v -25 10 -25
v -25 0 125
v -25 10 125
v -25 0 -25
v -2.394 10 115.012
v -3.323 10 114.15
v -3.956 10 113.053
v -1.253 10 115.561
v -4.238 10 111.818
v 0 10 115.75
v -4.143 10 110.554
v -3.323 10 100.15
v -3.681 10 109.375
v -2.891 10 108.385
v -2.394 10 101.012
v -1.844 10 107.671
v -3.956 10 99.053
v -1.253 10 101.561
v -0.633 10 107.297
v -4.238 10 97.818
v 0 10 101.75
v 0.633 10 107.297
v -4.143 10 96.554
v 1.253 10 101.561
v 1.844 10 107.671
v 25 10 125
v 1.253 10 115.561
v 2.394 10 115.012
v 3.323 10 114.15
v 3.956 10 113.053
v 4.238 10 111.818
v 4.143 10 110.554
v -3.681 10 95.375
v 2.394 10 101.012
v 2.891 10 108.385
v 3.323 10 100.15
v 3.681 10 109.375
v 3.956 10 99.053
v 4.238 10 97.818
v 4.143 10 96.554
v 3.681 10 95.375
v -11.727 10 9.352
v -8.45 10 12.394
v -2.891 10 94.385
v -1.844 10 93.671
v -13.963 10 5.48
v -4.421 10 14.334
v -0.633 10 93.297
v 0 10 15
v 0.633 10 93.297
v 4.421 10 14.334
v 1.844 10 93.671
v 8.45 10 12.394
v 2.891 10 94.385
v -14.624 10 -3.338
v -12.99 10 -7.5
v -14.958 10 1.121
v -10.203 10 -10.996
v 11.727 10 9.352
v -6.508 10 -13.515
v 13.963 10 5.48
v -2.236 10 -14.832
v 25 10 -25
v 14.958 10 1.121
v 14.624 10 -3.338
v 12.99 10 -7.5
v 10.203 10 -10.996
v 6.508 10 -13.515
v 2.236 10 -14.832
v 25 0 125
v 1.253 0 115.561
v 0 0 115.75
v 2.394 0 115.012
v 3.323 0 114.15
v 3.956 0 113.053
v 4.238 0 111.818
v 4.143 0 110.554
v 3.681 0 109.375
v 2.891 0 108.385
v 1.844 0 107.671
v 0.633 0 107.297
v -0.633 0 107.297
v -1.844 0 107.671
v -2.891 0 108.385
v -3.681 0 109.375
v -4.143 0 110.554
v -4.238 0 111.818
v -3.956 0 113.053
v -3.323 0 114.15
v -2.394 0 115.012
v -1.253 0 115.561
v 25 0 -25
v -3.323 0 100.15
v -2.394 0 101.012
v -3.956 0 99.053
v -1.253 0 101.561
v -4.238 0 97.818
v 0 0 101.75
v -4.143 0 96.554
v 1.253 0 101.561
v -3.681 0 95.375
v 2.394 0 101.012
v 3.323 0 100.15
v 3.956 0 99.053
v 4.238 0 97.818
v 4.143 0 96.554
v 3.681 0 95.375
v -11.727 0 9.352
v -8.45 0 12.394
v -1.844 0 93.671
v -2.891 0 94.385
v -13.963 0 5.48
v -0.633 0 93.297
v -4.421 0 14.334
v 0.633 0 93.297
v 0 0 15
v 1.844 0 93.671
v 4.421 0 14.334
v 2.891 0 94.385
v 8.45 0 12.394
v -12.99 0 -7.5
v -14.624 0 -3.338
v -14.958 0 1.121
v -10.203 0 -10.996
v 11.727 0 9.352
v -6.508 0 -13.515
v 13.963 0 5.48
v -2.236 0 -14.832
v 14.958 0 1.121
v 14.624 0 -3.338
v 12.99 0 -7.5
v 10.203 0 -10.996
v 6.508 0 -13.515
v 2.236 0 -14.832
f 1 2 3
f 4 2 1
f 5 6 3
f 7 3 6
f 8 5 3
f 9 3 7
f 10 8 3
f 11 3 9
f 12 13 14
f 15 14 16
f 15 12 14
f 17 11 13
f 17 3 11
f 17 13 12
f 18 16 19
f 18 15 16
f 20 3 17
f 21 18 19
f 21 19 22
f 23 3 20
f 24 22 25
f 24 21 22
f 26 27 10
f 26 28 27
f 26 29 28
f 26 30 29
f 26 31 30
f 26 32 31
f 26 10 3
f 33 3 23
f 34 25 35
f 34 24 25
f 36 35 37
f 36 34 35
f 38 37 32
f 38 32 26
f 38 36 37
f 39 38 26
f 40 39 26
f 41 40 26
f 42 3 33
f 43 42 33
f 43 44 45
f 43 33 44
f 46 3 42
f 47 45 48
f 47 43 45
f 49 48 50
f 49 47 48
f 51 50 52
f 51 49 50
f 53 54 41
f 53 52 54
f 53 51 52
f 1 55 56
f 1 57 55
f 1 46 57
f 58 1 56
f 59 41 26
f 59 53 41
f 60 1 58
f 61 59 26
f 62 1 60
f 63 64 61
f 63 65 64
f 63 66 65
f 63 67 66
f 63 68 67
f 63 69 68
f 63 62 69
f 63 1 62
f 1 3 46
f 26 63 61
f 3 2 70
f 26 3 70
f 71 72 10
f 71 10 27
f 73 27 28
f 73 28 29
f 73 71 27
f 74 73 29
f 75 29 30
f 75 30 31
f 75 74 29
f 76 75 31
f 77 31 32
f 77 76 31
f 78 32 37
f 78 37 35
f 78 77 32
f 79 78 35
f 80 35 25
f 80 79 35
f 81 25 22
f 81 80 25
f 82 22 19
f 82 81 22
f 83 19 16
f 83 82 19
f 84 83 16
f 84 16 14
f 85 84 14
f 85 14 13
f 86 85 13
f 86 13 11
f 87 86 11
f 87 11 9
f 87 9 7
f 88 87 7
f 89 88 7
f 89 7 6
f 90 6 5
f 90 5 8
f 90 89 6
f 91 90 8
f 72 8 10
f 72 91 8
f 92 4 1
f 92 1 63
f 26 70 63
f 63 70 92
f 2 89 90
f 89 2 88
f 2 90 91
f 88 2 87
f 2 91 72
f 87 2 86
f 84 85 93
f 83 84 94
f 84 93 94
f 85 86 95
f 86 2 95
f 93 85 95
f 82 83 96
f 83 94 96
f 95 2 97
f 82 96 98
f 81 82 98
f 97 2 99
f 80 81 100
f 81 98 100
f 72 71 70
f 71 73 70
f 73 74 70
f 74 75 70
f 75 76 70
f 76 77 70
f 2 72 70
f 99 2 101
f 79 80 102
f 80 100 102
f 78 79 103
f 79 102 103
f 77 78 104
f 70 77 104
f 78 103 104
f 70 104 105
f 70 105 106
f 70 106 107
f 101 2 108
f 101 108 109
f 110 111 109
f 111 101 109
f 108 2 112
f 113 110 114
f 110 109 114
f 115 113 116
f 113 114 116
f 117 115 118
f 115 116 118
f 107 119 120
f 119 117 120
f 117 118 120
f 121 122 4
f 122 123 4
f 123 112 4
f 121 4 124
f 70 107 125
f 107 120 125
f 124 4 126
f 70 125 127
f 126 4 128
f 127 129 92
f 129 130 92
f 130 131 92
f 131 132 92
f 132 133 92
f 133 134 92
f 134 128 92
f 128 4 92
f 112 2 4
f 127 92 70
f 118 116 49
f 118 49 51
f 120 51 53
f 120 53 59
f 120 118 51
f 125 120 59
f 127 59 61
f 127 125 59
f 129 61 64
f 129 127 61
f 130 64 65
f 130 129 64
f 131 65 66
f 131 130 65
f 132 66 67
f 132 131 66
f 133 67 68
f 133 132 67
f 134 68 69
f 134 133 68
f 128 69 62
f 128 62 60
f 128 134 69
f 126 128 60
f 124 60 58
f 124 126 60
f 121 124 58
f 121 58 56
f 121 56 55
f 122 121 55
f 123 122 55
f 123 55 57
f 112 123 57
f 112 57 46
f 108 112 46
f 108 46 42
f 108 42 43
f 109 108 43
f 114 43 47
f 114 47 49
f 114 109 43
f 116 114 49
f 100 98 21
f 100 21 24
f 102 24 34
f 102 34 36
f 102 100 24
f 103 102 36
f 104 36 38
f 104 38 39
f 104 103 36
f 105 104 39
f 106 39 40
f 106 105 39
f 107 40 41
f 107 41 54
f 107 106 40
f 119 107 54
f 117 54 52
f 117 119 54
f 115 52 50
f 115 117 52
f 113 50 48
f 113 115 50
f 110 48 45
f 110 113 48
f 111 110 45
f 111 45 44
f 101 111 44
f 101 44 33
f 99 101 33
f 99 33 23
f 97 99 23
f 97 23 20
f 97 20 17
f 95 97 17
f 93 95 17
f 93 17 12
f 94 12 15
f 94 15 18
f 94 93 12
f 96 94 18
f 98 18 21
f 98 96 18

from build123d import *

# Parameters (mm, degrees)
SKETCH1_W           = 50
SKETCH1_H           = 150
SKETCH1_R           = 15
BOSS_EXTRUDE1_DEPTH = 10
SKETCH2_R           = 4.25
CUT_EXTRUDE1_DEPTH  = 10


with BuildPart() as part:
    # Sketch1 → Boss-Extrude1 (new body)
    with BuildSketch(Plane(origin=(0, 0, 0), x_dir=(1, 0, 0), z_dir=(0, 1, 0))):
        with Locations((0, -50)):
            Rectangle(SKETCH1_W, SKETCH1_H)
        with Locations(Location((0, 0, 0), (0, 0, 270))):
            Circle(SKETCH1_R, mode=Mode.SUBTRACT)
    extrude(amount=BOSS_EXTRUDE1_DEPTH)

    # Sketch2 → Cut-Extrude1 (cut)
    with BuildSketch(Plane(origin=(0, 0, 0), x_dir=(1, 0, 0), z_dir=(0, 1, 0))):
        with Locations(Location((0, -111.5, 0), (0, 0, 270))):
            Circle(SKETCH2_R)
        with Locations(Location((0, -97.5, 0), (0, 0, 270))):
            Circle(SKETCH2_R)
    extrude(amount=CUT_EXTRUDE1_DEPTH, mode=Mode.SUBTRACT)


solid = part.part
